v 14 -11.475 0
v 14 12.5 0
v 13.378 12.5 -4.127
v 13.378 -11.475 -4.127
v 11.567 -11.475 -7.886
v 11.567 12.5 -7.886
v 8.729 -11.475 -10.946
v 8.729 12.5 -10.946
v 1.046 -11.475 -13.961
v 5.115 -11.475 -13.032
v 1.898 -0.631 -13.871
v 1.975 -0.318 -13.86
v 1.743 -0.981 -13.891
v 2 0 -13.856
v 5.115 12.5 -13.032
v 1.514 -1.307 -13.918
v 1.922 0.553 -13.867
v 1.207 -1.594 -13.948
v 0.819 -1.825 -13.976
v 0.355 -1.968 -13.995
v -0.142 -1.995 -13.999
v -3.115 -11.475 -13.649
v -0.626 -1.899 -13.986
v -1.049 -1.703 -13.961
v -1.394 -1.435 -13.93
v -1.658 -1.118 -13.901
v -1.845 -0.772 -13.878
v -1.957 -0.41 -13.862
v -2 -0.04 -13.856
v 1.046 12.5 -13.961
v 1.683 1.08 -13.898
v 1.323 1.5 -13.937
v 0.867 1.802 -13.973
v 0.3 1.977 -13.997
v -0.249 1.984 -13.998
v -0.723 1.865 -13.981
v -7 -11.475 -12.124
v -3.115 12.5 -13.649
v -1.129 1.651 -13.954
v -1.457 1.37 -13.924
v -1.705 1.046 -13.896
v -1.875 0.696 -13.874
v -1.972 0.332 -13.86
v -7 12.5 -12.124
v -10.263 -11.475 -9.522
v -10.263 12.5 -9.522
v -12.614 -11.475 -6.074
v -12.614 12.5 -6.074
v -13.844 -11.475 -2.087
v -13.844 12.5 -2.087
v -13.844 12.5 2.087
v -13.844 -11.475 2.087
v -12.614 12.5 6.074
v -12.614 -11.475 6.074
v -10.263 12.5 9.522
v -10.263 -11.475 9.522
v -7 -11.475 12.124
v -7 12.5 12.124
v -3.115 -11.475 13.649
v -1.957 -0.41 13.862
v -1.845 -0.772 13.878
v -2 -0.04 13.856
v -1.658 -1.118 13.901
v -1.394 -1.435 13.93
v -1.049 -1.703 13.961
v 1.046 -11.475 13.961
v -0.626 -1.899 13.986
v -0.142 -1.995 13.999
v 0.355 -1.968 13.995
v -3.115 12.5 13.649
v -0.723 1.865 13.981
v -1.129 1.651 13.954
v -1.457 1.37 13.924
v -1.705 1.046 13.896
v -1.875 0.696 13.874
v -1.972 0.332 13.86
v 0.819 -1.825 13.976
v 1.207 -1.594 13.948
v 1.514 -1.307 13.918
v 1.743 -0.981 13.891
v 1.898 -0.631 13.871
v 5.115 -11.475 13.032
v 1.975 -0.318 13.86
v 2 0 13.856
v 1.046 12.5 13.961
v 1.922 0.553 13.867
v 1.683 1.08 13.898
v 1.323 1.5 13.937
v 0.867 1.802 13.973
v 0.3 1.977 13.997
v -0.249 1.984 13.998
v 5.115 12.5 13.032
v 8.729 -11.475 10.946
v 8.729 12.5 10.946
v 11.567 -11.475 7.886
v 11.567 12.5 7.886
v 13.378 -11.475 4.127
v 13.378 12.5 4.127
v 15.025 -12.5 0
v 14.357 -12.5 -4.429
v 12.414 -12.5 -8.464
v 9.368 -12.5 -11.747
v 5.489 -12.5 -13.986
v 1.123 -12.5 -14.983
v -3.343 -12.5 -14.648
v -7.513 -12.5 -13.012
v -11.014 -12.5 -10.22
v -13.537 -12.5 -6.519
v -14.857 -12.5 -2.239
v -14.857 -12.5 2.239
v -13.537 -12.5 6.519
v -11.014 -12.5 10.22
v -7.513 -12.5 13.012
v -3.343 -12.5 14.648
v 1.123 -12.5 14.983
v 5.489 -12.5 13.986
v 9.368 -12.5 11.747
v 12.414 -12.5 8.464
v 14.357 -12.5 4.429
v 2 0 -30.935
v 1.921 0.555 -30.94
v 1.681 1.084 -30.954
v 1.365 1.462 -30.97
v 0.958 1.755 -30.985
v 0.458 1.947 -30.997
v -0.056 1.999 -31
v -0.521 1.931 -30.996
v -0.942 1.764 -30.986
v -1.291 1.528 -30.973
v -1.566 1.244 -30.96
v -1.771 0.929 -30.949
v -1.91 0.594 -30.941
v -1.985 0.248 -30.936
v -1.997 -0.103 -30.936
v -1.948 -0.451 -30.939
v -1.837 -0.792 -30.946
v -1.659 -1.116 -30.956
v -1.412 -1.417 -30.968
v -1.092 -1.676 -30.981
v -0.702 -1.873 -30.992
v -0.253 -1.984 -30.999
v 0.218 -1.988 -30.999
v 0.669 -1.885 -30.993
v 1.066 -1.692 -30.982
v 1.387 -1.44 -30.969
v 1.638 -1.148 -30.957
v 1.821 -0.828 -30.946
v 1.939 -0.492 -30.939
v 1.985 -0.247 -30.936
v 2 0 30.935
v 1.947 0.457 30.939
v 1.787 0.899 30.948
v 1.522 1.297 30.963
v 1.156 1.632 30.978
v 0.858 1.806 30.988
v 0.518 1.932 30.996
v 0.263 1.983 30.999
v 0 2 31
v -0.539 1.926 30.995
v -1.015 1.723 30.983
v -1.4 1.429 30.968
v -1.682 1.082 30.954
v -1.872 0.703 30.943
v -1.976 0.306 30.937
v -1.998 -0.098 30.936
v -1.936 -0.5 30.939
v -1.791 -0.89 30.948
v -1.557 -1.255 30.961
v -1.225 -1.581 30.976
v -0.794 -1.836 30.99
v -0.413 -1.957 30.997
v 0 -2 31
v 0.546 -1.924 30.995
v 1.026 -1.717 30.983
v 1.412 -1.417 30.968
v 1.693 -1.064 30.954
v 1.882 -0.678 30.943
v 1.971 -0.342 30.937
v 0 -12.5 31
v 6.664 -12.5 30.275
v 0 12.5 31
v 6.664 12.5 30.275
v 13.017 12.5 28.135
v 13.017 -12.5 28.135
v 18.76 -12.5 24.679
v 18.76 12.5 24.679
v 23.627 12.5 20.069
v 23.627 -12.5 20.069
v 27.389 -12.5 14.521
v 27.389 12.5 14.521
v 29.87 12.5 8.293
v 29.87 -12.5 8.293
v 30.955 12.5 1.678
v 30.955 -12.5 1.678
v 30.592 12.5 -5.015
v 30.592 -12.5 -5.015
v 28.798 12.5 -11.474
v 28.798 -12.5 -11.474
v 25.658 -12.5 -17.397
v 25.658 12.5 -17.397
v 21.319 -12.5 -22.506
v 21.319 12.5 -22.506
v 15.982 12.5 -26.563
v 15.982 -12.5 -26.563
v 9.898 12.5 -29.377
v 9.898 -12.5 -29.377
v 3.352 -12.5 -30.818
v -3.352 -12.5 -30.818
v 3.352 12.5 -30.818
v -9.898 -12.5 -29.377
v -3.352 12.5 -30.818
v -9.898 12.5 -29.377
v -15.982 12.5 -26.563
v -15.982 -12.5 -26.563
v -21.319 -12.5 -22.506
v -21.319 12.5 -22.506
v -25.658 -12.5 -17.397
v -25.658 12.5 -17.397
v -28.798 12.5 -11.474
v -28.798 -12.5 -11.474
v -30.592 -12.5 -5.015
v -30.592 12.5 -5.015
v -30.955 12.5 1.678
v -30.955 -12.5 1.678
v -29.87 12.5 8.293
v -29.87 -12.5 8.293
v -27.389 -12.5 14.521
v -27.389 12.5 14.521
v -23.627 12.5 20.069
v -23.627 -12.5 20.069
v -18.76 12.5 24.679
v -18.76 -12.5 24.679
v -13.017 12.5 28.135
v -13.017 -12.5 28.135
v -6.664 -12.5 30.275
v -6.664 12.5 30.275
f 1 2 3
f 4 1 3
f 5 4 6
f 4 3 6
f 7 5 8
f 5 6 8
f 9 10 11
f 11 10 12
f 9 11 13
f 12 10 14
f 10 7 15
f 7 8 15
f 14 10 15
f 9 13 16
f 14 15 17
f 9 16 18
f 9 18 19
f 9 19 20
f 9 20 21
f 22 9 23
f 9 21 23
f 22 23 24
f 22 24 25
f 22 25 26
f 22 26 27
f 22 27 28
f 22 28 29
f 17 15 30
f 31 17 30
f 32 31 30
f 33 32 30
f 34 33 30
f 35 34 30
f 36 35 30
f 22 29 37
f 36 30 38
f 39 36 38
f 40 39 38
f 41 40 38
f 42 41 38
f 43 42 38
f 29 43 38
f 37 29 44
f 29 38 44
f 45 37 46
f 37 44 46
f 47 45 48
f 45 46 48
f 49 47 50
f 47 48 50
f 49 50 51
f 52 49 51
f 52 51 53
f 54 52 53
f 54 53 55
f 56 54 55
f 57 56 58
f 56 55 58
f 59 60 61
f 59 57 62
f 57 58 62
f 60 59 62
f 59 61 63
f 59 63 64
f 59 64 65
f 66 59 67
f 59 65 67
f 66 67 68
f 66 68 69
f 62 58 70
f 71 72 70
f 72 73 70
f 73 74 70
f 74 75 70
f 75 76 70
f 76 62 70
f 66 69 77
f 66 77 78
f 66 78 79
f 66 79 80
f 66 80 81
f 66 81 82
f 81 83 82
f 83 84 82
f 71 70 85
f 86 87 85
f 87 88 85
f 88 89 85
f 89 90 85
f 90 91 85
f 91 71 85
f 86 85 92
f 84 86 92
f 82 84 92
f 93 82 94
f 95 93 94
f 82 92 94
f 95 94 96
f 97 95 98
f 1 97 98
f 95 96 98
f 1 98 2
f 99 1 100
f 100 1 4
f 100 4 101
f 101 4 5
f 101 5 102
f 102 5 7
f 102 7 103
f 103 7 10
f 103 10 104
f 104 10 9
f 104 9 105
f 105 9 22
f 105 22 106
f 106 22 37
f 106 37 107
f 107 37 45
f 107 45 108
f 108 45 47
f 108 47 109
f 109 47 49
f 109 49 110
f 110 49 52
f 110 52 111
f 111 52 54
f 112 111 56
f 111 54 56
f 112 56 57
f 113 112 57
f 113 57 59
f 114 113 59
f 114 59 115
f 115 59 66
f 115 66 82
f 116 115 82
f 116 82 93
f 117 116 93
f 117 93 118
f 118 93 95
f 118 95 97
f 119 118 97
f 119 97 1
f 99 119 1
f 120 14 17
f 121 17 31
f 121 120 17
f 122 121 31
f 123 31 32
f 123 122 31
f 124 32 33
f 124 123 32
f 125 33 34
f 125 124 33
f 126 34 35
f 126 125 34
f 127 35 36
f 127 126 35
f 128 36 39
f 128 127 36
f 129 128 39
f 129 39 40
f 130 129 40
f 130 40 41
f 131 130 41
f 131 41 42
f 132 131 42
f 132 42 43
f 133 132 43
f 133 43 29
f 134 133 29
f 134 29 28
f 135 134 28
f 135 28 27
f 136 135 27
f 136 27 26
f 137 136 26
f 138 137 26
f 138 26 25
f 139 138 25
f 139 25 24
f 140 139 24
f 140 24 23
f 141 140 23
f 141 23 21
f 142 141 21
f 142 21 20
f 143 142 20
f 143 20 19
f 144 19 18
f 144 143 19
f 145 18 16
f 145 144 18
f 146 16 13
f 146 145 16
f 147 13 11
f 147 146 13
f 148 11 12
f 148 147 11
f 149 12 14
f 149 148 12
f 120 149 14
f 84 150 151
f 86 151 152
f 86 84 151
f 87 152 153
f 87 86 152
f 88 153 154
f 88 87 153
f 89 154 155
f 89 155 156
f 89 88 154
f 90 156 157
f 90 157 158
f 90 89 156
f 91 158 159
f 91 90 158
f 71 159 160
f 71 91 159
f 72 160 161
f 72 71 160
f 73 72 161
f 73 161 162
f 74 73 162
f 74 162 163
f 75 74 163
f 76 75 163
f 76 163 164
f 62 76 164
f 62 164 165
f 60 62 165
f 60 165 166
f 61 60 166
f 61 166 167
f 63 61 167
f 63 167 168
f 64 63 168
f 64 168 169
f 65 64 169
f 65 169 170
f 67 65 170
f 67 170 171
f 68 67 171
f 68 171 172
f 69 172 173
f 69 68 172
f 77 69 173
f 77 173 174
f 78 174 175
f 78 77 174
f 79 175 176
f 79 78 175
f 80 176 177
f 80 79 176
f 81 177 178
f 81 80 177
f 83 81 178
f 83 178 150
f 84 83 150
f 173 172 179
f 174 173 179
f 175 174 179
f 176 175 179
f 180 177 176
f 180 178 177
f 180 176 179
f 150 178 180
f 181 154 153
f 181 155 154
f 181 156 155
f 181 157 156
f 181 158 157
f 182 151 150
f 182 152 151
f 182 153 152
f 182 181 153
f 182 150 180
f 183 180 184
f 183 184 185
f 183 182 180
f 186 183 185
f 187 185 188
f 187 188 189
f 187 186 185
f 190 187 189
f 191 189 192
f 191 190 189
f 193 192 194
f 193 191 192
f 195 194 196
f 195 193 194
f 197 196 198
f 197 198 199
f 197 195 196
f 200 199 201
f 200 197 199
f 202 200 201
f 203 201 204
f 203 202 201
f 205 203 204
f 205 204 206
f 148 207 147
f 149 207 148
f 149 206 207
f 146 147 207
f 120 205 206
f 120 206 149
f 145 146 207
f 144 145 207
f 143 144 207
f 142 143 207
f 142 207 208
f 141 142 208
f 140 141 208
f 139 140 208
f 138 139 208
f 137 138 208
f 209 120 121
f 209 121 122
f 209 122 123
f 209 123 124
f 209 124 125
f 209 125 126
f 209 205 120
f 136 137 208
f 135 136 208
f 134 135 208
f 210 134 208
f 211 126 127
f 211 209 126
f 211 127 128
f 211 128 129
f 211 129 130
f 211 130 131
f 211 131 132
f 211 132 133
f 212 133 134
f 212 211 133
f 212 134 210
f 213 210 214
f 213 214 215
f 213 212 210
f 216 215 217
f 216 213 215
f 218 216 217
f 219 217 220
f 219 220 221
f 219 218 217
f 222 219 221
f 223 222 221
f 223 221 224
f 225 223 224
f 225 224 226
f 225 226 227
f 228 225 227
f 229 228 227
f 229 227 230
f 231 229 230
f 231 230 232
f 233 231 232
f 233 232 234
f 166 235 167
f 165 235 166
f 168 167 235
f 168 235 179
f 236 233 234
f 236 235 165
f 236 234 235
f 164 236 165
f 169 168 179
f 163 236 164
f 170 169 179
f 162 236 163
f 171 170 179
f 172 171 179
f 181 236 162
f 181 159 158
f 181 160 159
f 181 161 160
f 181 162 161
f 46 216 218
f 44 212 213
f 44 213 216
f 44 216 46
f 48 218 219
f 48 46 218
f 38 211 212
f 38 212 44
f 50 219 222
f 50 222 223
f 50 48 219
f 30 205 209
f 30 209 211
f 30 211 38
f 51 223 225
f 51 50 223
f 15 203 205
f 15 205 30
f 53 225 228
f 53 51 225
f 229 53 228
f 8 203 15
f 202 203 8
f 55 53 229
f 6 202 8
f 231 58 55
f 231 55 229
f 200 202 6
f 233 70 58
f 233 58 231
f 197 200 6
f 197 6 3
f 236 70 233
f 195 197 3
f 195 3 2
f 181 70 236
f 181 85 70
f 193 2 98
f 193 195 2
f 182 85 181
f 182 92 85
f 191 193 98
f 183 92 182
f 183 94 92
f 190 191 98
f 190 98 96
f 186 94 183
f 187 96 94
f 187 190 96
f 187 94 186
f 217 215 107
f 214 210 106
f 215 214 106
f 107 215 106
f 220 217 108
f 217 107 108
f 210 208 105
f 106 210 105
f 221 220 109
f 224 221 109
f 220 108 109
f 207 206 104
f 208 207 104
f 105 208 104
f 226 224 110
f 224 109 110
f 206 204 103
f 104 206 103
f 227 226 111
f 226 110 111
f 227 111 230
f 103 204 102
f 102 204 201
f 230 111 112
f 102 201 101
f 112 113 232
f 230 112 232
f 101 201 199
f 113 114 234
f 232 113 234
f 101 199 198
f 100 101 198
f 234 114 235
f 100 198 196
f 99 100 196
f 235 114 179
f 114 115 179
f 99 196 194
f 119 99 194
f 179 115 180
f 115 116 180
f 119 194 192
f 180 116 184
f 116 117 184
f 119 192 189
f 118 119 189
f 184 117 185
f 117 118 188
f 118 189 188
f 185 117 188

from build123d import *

# Parameters (mm, degrees)
SKETCH1_R                        = 31
BOSS_EXTRUDE1_DEPTH              = 12.5
CUT_EXTRUDE1_DEPTH               = 46.587827323
CUT_EXTRUDE1_DEPTH_BACK          = 46.587827323
SKETCH2_R                        = 2
M30X2_0_TAPPED_HOLE1_D           = 28
M30X2_0_TAPPED_HOLE1_DEPTH       = 25
M30X2_0_TAPPED_HOLE1_CSINK_D     = 30.05
M30X2_0_TAPPED_HOLE1_CSINK_ANGLE = 90
M30X2_0_TAPPED_HOLE1_TIP         = 8.412048666


with BuildPart() as part:
    # Sketch1 → Boss-Extrude1 (new, symmetric)
    with BuildSketch(Plane(origin=(0, 0, 0), x_dir=(1, 0, 0), z_dir=(0, 1, 0))):
        with Locations(Location((0, 0, 0), (0, 0, 270))):
            Circle(SKETCH1_R)
    extrude(amount=BOSS_EXTRUDE1_DEPTH, both=True)

    # Sketch2 → Cut-Extrude1 (cut, two sides: drawn at the far end of the back side and taken through both)
    with BuildSketch(Plane.XY.offset(-CUT_EXTRUDE1_DEPTH_BACK)):
        Circle(SKETCH2_R)
    extrude(amount=CUT_EXTRUDE1_DEPTH + CUT_EXTRUDE1_DEPTH_BACK, mode=Mode.SUBTRACT)

    # M30x2.0 Tapped Hole1
    with Locations(Plane(origin=(0, -12.5, 0), x_dir=(-1, 0, 0), z_dir=(0, -1, 0))):
        with Locations((0, 0)):
            CounterSinkHole(M30X2_0_TAPPED_HOLE1_D / 2, M30X2_0_TAPPED_HOLE1_CSINK_D / 2, depth=M30X2_0_TAPPED_HOLE1_DEPTH, counter_sink_angle=M30X2_0_TAPPED_HOLE1_CSINK_ANGLE)
            with Locations((0, 0, -(M30X2_0_TAPPED_HOLE1_DEPTH + M30X2_0_TAPPED_HOLE1_TIP / 2))):  # 118° drill point
                Cone(0, M30X2_0_TAPPED_HOLE1_D / 2, M30X2_0_TAPPED_HOLE1_TIP, mode=Mode.SUBTRACT)


solid = part.part
